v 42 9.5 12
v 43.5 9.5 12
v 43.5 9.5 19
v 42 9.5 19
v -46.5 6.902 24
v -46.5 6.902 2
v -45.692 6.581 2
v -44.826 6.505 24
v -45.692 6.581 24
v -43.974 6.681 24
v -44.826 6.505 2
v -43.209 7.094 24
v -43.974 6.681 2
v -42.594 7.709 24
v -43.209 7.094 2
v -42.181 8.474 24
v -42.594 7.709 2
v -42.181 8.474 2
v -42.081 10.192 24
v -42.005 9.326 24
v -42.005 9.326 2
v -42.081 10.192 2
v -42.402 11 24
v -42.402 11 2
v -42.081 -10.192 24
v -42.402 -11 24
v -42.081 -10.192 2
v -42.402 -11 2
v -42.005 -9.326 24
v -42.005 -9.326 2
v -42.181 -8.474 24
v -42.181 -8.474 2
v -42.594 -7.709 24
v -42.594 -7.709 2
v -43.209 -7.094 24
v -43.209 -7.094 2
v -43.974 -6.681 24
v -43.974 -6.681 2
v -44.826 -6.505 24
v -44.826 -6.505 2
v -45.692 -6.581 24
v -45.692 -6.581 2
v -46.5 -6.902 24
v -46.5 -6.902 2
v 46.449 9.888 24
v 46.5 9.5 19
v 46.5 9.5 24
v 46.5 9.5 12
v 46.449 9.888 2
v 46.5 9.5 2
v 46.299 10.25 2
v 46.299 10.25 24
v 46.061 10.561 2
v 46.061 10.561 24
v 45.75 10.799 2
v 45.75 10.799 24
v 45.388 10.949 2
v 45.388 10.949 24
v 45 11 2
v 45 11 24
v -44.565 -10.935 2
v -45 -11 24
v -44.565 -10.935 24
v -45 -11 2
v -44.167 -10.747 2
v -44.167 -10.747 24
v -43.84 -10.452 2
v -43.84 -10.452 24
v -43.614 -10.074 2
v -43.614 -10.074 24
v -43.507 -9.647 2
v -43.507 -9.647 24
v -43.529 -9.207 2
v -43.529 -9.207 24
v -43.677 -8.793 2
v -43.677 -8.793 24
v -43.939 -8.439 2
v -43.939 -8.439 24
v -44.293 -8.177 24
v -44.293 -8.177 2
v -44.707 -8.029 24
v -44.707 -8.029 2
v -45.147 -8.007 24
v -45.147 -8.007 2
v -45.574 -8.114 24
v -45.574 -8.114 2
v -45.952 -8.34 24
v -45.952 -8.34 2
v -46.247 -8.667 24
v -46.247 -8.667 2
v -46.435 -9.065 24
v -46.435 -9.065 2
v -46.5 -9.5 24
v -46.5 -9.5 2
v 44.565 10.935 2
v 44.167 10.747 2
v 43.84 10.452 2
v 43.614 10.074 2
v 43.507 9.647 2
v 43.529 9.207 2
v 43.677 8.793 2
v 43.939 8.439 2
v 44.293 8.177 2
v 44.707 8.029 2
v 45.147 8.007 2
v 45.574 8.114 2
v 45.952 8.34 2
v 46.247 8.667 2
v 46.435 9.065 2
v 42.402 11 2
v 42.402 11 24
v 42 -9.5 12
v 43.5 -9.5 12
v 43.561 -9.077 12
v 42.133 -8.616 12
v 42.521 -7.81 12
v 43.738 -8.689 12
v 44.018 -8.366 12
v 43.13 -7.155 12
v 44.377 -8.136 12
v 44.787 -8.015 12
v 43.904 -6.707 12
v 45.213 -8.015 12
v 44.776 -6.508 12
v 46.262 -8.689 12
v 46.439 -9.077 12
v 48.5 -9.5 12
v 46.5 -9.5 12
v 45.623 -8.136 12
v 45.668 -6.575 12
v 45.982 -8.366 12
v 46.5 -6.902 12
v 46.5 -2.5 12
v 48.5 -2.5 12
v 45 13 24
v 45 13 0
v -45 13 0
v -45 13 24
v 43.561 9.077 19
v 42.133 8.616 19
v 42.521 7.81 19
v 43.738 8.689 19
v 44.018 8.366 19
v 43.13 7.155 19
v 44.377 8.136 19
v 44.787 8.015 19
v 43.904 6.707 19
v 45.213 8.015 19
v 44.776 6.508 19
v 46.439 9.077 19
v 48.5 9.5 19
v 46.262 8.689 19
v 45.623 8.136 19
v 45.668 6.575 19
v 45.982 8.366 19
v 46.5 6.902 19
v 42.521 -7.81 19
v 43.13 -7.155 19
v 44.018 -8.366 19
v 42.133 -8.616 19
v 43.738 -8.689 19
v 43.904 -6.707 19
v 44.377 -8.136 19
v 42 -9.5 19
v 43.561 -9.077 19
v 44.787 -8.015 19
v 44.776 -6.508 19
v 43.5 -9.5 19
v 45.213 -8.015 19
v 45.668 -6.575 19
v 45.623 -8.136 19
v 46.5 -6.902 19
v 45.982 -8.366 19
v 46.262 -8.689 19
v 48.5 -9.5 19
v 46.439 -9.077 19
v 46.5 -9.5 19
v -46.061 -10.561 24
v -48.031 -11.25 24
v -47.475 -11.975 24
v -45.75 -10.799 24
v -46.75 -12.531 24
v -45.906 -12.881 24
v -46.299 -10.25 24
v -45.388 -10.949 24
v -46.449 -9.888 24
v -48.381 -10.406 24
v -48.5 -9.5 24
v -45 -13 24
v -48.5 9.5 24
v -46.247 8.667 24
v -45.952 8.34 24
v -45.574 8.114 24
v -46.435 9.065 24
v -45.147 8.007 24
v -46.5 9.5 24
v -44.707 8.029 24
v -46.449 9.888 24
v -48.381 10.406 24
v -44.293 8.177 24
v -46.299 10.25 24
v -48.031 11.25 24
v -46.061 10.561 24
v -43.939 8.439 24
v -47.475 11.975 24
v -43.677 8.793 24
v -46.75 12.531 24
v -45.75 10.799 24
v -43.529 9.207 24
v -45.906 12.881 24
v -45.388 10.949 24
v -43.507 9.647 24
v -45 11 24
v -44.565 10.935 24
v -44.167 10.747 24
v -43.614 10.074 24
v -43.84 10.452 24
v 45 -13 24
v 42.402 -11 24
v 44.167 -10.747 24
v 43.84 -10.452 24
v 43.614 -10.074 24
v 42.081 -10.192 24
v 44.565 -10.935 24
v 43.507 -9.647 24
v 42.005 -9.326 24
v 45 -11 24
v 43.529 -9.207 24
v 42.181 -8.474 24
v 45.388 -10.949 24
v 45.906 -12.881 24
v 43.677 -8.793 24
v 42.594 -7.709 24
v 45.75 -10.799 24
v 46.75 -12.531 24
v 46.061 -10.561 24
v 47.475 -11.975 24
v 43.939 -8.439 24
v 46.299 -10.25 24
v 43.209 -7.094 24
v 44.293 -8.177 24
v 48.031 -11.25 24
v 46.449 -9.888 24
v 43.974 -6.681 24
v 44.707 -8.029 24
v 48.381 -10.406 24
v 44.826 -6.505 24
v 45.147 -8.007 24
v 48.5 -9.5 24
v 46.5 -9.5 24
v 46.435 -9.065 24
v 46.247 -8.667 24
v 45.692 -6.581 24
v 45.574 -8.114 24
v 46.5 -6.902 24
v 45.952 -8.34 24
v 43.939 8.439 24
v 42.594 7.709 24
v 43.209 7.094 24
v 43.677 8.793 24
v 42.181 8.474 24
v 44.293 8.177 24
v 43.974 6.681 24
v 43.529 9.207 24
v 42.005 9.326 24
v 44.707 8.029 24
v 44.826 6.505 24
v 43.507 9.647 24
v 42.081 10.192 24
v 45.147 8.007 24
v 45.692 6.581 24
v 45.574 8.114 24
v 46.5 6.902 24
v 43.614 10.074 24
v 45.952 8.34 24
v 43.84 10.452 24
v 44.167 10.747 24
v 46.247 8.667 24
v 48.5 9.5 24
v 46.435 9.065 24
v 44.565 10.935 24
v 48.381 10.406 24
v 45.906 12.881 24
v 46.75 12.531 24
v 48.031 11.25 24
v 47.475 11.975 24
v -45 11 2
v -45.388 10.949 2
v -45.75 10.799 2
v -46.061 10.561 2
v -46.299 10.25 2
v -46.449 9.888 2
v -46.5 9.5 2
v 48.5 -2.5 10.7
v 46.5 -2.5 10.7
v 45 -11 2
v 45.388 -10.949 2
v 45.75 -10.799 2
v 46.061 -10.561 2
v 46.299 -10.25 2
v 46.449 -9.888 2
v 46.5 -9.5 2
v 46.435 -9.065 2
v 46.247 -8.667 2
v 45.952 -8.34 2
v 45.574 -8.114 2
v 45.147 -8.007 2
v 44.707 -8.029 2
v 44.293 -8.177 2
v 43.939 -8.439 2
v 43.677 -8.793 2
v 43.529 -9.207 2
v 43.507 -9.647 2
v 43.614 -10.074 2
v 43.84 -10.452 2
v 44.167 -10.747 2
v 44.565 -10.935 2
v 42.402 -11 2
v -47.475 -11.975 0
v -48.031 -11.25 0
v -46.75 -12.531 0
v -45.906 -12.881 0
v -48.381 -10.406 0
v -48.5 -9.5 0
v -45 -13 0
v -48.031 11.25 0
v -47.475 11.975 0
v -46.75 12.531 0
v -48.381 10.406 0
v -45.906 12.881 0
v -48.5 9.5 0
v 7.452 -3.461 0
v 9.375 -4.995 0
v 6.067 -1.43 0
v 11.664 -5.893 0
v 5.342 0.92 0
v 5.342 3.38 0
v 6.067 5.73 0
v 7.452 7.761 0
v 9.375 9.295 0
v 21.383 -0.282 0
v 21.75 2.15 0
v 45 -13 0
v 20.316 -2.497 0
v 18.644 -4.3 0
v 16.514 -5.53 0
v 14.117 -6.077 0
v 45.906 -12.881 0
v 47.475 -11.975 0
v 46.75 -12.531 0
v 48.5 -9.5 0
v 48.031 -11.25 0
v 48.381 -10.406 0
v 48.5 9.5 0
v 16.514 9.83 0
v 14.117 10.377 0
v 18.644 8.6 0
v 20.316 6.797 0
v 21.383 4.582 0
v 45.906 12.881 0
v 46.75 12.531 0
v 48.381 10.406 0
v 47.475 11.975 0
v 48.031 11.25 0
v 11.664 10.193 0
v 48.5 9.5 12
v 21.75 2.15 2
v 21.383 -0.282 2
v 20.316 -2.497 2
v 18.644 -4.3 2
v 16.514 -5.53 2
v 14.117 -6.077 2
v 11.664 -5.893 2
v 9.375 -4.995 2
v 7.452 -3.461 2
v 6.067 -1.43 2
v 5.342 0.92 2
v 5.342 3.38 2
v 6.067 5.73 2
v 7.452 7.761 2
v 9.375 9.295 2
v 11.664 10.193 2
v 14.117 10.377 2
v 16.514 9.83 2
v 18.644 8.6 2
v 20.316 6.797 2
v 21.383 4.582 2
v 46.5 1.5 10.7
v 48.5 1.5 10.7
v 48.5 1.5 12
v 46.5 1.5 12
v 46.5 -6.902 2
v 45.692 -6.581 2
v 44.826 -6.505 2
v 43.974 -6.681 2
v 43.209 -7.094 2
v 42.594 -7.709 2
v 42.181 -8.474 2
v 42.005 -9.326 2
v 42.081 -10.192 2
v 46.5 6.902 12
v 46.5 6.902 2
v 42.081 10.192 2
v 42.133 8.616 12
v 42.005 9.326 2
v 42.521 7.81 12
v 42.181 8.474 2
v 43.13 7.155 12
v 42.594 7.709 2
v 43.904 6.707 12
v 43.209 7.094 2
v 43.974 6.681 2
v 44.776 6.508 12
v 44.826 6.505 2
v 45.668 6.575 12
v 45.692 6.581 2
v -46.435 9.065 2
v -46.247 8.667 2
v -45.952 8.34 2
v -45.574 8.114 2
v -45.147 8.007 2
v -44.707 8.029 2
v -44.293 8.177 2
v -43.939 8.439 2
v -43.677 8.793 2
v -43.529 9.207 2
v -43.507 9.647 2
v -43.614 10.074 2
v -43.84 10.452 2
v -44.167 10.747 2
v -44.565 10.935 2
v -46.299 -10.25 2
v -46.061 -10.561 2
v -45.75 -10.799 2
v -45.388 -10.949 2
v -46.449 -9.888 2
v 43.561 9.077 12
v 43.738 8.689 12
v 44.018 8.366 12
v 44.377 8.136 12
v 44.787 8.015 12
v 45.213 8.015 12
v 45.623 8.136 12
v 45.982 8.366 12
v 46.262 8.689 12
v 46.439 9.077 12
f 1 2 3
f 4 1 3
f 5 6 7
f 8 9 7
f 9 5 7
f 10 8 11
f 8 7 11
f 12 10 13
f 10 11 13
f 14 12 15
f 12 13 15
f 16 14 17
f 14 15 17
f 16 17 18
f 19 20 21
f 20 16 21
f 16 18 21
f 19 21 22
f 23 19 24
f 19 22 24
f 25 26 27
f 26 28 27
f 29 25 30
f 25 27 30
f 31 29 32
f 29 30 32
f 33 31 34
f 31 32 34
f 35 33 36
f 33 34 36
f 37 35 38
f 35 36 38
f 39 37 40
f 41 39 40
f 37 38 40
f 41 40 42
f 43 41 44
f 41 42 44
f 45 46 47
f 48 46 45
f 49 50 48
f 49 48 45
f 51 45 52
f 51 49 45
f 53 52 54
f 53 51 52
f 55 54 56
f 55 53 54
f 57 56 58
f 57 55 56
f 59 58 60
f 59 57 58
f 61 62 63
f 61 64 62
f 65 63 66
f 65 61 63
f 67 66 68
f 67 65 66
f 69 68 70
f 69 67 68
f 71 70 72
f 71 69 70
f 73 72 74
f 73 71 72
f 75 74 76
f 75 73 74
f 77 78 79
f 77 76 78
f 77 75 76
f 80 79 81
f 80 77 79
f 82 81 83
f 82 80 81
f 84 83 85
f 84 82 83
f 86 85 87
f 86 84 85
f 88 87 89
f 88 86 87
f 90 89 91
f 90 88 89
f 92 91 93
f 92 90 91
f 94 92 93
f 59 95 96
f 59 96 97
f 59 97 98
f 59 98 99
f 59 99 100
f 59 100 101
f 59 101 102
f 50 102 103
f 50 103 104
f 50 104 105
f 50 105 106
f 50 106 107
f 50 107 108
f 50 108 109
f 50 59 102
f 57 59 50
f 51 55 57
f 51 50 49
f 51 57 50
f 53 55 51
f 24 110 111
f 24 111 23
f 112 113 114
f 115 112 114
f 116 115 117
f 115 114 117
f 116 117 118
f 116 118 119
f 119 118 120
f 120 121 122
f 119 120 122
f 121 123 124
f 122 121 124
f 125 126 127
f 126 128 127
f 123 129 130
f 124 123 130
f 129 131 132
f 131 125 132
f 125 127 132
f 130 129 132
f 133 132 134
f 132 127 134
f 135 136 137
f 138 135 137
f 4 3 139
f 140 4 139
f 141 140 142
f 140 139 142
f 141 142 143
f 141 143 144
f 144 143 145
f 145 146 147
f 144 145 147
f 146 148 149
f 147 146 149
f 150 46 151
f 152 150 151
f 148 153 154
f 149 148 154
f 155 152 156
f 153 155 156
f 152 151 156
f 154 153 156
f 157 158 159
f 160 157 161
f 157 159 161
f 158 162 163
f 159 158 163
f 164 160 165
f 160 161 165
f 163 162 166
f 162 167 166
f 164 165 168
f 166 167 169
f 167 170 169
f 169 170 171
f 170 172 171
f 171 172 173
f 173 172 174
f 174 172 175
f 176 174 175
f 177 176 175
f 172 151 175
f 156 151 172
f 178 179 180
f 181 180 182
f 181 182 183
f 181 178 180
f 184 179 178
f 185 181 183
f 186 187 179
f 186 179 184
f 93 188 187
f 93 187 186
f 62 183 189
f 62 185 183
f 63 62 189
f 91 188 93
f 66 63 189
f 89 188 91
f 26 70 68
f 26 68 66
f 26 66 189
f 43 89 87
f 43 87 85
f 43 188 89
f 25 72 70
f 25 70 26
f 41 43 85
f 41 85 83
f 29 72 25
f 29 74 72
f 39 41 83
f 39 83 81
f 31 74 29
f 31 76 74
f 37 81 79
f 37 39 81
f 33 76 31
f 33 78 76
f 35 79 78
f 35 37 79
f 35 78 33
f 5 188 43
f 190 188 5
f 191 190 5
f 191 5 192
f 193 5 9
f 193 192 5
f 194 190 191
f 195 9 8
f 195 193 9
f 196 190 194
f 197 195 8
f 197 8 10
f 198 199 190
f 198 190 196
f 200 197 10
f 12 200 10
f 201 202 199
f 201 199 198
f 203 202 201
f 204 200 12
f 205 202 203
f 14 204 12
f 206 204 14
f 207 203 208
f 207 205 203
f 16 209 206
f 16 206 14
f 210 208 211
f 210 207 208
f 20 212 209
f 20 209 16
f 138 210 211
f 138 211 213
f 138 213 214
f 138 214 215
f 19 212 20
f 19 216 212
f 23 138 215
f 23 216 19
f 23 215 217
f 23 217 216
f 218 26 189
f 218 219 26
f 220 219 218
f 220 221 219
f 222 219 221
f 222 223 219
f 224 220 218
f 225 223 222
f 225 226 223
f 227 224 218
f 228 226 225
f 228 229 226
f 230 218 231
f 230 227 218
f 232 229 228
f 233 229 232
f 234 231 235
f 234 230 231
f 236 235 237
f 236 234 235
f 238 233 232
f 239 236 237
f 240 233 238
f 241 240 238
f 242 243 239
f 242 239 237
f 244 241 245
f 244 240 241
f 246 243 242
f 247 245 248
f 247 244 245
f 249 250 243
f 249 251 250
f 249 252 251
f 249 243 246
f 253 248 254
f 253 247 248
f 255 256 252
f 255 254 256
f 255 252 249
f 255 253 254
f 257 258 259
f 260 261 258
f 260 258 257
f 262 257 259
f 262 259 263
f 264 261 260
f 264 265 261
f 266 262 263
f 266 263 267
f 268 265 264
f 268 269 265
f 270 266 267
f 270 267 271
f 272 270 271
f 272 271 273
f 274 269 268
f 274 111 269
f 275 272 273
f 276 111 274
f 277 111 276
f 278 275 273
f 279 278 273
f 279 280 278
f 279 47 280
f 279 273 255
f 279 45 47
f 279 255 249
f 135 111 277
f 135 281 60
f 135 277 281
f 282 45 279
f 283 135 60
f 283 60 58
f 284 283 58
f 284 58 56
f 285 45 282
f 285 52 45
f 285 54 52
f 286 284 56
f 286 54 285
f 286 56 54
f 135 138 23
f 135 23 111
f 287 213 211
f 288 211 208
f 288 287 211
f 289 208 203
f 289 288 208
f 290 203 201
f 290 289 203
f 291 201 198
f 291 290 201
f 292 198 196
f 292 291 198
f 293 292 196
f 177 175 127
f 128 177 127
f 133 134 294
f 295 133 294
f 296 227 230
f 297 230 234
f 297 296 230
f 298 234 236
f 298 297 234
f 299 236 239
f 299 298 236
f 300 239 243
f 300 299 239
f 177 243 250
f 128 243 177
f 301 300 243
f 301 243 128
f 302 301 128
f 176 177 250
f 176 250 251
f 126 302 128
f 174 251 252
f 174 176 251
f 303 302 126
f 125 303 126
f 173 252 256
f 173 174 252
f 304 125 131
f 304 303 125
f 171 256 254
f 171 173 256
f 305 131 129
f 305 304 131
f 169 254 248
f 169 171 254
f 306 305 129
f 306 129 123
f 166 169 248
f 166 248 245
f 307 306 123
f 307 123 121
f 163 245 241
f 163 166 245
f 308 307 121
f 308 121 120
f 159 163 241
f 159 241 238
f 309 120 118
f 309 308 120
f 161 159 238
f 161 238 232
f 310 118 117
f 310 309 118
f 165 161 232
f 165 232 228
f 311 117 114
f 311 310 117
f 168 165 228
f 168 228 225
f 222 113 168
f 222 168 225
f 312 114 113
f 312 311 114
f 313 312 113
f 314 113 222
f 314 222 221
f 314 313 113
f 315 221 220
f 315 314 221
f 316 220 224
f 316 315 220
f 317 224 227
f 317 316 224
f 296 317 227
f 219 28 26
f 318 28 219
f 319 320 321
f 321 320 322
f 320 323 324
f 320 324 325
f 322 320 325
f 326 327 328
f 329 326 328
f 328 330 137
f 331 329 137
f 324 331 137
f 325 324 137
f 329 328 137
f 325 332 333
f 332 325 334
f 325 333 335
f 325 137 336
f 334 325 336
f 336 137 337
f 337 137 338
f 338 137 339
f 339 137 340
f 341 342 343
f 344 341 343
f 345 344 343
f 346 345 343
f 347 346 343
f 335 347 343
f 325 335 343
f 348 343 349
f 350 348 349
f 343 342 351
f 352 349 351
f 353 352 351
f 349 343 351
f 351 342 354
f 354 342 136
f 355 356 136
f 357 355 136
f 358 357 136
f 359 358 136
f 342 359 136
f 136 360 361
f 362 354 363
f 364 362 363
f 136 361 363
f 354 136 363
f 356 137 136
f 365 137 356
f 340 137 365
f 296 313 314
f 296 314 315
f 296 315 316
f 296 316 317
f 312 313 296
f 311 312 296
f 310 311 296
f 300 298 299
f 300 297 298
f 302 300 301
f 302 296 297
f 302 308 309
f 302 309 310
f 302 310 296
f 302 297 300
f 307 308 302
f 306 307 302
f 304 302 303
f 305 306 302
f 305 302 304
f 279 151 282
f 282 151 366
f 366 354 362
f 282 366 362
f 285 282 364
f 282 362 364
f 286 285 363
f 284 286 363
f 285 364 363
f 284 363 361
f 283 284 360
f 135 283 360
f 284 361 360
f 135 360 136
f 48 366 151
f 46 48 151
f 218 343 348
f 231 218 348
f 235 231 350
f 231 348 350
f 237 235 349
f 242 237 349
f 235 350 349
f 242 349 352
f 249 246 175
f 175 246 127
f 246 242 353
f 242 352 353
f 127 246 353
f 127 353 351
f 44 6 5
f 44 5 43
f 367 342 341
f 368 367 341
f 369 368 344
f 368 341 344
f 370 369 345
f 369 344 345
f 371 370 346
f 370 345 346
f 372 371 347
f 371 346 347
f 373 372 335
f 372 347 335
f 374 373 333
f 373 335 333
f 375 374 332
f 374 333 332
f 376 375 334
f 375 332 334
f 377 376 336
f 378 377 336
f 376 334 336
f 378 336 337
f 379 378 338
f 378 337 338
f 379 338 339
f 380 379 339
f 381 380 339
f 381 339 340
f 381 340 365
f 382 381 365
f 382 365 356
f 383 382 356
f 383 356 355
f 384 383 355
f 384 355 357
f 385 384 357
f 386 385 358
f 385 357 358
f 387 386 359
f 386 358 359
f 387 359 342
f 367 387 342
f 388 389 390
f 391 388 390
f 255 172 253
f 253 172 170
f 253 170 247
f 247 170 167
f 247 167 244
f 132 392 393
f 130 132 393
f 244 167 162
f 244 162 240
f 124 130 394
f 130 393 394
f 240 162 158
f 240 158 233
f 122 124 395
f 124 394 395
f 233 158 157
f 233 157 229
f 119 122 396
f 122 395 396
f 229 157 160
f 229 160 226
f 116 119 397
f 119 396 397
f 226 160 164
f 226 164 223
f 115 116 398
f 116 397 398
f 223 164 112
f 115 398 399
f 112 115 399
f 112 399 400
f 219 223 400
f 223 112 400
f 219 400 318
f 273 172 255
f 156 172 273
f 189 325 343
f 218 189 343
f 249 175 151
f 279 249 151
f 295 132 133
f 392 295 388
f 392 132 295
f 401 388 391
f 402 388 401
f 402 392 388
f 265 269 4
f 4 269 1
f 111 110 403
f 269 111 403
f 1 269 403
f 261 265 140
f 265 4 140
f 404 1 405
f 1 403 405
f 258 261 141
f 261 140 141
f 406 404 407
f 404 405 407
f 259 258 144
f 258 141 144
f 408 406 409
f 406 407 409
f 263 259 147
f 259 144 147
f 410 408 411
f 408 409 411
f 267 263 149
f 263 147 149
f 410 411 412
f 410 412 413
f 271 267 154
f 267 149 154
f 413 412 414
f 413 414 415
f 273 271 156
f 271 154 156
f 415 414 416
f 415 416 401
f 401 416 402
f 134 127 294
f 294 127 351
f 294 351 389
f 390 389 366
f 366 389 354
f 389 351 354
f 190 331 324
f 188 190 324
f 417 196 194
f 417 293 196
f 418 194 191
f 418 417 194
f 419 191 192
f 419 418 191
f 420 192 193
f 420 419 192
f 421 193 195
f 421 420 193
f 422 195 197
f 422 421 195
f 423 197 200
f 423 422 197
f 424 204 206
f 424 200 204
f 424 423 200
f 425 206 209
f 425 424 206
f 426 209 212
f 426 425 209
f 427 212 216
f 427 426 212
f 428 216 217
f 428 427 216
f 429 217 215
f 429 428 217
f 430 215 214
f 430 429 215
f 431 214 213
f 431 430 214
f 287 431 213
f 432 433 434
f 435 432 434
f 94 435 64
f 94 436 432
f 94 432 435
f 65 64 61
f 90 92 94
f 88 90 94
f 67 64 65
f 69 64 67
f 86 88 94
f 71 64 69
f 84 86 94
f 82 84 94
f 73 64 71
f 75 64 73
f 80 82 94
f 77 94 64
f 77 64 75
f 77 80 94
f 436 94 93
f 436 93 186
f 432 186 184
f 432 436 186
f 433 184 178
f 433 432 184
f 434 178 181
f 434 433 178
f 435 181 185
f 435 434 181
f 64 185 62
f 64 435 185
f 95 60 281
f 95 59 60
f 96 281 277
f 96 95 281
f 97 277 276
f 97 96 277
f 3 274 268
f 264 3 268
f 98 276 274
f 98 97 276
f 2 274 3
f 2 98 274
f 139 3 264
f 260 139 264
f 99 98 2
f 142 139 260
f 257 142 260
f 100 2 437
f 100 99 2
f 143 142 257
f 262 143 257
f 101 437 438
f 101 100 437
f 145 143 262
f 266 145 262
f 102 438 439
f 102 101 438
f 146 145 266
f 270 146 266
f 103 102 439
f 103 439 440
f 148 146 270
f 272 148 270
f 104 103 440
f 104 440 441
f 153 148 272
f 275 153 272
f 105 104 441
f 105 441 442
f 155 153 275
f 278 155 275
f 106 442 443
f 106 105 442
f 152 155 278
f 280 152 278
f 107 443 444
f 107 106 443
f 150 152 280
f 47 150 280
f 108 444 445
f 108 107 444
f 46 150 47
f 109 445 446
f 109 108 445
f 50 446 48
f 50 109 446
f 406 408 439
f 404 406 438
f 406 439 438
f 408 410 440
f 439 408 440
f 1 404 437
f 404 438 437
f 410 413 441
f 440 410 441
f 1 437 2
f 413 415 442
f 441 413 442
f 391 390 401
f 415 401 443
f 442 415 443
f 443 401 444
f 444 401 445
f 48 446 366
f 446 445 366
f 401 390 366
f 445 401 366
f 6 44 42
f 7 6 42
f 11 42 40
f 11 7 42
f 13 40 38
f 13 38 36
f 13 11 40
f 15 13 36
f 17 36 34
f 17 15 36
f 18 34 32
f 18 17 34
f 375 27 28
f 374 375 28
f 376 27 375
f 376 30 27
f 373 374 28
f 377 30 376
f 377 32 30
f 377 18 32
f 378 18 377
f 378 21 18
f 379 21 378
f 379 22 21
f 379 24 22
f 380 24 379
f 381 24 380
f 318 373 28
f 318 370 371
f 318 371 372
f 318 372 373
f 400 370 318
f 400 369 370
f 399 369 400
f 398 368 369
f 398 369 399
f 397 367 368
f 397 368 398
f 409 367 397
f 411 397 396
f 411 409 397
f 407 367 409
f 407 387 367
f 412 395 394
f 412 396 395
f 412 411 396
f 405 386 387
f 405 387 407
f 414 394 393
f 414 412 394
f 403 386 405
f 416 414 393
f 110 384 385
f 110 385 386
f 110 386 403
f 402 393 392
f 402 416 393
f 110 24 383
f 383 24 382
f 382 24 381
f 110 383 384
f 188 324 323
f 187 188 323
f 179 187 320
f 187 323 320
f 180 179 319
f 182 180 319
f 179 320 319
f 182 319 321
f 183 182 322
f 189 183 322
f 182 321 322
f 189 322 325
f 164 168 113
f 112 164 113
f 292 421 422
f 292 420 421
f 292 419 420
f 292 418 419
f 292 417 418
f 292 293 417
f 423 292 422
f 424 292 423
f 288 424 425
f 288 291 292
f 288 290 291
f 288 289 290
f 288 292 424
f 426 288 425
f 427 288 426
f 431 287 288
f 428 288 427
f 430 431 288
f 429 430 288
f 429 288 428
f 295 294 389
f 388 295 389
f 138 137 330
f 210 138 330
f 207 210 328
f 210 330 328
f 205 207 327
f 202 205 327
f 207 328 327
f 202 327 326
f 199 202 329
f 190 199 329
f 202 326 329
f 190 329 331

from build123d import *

# Parameters (mm, degrees)
F1_DEPTH = 24
F2_T     = -2
F3_R     = 8.25
F4_DEPTH = 2
F5_R     = 3
F5_R_2   = 1.5000011027
F6_DEPTH = 22
F8_DEPTH = 10


with BuildPart() as f1:
    # F0 (on Top) → F1 (new body)
    with BuildSketch(Plane.XY):
        with BuildLine():
            ThreePointArc((48.5, 9.5), (47.4748737342, 11.9748737342), (45, 13))
            Line((45, 13), (-45, 13))
            ThreePointArc((-45, 13), (-47.4748737342, 11.9748737342), (-48.5, 9.5))
            Line((-48.5, 9.5), (-48.5, -9.5))
            ThreePointArc((-48.5, -9.5), (-47.4748737342, -11.9748737342), (-45, -13))
            Line((-45, -13), (45, -13))
            ThreePointArc((45, -13), (47.4748737342, -11.9748737342), (48.5, -9.5))
            Line((48.5, -9.5), (48.5, 9.5))
        make_face()
    extrude(amount=F1_DEPTH)

    # F2
    f2_openings = [f1.faces().sort_by_distance(p)[0] for p in [
        (0, 0, 24),
    ]]
    offset(amount=F2_T, openings=f2_openings)

    # F3 (on face) → F4 (cut, through all)
    with BuildSketch(Plane(origin=(0, 0, 0), x_dir=(1, 0, 0), z_dir=(0, 0, -1))):
        with Locations((13.5, -2.15)):
            Circle(F3_R)
    extrude(amount=-F4_DEPTH, mode=Mode.SUBTRACT)

    # F5 (on face) → F6 (join, through all)
    with BuildSketch(Plane.XY.offset(2)):
        with Locations((-45, 9.5)):
            Circle(F5_R)
        with Locations((-45, 9.5)):
            Circle(F5_R_2, mode=Mode.SUBTRACT)
        with Locations((45, 9.5)):
            Circle(F5_R)
        with Locations((45, 9.5)):
            Circle(F5_R_2, mode=Mode.SUBTRACT)
        with Locations((-45, -9.5)):
            Circle(F5_R)
        with Locations((-45, -9.5)):
            Circle(F5_R_2, mode=Mode.SUBTRACT)
        with Locations((45, -9.5)):
            Circle(F5_R)
        with Locations((45, -9.5)):
            Circle(F5_R_2, mode=Mode.SUBTRACT)
    extrude(amount=F6_DEPTH)

    # F7 (on face) → F8 (cut)
    with BuildSketch(Plane.YZ.offset(48.5)):
        Polygon((9.5, 19), (-9.5, 19), (-9.5, 12), (-2.5, 12), (-2.5, 10.7), (1.5, 10.7), (1.5, 12), (9.5, 12), align=None)
    extrude(amount=-F8_DEPTH, mode=Mode.SUBTRACT)


solid = f1.part
